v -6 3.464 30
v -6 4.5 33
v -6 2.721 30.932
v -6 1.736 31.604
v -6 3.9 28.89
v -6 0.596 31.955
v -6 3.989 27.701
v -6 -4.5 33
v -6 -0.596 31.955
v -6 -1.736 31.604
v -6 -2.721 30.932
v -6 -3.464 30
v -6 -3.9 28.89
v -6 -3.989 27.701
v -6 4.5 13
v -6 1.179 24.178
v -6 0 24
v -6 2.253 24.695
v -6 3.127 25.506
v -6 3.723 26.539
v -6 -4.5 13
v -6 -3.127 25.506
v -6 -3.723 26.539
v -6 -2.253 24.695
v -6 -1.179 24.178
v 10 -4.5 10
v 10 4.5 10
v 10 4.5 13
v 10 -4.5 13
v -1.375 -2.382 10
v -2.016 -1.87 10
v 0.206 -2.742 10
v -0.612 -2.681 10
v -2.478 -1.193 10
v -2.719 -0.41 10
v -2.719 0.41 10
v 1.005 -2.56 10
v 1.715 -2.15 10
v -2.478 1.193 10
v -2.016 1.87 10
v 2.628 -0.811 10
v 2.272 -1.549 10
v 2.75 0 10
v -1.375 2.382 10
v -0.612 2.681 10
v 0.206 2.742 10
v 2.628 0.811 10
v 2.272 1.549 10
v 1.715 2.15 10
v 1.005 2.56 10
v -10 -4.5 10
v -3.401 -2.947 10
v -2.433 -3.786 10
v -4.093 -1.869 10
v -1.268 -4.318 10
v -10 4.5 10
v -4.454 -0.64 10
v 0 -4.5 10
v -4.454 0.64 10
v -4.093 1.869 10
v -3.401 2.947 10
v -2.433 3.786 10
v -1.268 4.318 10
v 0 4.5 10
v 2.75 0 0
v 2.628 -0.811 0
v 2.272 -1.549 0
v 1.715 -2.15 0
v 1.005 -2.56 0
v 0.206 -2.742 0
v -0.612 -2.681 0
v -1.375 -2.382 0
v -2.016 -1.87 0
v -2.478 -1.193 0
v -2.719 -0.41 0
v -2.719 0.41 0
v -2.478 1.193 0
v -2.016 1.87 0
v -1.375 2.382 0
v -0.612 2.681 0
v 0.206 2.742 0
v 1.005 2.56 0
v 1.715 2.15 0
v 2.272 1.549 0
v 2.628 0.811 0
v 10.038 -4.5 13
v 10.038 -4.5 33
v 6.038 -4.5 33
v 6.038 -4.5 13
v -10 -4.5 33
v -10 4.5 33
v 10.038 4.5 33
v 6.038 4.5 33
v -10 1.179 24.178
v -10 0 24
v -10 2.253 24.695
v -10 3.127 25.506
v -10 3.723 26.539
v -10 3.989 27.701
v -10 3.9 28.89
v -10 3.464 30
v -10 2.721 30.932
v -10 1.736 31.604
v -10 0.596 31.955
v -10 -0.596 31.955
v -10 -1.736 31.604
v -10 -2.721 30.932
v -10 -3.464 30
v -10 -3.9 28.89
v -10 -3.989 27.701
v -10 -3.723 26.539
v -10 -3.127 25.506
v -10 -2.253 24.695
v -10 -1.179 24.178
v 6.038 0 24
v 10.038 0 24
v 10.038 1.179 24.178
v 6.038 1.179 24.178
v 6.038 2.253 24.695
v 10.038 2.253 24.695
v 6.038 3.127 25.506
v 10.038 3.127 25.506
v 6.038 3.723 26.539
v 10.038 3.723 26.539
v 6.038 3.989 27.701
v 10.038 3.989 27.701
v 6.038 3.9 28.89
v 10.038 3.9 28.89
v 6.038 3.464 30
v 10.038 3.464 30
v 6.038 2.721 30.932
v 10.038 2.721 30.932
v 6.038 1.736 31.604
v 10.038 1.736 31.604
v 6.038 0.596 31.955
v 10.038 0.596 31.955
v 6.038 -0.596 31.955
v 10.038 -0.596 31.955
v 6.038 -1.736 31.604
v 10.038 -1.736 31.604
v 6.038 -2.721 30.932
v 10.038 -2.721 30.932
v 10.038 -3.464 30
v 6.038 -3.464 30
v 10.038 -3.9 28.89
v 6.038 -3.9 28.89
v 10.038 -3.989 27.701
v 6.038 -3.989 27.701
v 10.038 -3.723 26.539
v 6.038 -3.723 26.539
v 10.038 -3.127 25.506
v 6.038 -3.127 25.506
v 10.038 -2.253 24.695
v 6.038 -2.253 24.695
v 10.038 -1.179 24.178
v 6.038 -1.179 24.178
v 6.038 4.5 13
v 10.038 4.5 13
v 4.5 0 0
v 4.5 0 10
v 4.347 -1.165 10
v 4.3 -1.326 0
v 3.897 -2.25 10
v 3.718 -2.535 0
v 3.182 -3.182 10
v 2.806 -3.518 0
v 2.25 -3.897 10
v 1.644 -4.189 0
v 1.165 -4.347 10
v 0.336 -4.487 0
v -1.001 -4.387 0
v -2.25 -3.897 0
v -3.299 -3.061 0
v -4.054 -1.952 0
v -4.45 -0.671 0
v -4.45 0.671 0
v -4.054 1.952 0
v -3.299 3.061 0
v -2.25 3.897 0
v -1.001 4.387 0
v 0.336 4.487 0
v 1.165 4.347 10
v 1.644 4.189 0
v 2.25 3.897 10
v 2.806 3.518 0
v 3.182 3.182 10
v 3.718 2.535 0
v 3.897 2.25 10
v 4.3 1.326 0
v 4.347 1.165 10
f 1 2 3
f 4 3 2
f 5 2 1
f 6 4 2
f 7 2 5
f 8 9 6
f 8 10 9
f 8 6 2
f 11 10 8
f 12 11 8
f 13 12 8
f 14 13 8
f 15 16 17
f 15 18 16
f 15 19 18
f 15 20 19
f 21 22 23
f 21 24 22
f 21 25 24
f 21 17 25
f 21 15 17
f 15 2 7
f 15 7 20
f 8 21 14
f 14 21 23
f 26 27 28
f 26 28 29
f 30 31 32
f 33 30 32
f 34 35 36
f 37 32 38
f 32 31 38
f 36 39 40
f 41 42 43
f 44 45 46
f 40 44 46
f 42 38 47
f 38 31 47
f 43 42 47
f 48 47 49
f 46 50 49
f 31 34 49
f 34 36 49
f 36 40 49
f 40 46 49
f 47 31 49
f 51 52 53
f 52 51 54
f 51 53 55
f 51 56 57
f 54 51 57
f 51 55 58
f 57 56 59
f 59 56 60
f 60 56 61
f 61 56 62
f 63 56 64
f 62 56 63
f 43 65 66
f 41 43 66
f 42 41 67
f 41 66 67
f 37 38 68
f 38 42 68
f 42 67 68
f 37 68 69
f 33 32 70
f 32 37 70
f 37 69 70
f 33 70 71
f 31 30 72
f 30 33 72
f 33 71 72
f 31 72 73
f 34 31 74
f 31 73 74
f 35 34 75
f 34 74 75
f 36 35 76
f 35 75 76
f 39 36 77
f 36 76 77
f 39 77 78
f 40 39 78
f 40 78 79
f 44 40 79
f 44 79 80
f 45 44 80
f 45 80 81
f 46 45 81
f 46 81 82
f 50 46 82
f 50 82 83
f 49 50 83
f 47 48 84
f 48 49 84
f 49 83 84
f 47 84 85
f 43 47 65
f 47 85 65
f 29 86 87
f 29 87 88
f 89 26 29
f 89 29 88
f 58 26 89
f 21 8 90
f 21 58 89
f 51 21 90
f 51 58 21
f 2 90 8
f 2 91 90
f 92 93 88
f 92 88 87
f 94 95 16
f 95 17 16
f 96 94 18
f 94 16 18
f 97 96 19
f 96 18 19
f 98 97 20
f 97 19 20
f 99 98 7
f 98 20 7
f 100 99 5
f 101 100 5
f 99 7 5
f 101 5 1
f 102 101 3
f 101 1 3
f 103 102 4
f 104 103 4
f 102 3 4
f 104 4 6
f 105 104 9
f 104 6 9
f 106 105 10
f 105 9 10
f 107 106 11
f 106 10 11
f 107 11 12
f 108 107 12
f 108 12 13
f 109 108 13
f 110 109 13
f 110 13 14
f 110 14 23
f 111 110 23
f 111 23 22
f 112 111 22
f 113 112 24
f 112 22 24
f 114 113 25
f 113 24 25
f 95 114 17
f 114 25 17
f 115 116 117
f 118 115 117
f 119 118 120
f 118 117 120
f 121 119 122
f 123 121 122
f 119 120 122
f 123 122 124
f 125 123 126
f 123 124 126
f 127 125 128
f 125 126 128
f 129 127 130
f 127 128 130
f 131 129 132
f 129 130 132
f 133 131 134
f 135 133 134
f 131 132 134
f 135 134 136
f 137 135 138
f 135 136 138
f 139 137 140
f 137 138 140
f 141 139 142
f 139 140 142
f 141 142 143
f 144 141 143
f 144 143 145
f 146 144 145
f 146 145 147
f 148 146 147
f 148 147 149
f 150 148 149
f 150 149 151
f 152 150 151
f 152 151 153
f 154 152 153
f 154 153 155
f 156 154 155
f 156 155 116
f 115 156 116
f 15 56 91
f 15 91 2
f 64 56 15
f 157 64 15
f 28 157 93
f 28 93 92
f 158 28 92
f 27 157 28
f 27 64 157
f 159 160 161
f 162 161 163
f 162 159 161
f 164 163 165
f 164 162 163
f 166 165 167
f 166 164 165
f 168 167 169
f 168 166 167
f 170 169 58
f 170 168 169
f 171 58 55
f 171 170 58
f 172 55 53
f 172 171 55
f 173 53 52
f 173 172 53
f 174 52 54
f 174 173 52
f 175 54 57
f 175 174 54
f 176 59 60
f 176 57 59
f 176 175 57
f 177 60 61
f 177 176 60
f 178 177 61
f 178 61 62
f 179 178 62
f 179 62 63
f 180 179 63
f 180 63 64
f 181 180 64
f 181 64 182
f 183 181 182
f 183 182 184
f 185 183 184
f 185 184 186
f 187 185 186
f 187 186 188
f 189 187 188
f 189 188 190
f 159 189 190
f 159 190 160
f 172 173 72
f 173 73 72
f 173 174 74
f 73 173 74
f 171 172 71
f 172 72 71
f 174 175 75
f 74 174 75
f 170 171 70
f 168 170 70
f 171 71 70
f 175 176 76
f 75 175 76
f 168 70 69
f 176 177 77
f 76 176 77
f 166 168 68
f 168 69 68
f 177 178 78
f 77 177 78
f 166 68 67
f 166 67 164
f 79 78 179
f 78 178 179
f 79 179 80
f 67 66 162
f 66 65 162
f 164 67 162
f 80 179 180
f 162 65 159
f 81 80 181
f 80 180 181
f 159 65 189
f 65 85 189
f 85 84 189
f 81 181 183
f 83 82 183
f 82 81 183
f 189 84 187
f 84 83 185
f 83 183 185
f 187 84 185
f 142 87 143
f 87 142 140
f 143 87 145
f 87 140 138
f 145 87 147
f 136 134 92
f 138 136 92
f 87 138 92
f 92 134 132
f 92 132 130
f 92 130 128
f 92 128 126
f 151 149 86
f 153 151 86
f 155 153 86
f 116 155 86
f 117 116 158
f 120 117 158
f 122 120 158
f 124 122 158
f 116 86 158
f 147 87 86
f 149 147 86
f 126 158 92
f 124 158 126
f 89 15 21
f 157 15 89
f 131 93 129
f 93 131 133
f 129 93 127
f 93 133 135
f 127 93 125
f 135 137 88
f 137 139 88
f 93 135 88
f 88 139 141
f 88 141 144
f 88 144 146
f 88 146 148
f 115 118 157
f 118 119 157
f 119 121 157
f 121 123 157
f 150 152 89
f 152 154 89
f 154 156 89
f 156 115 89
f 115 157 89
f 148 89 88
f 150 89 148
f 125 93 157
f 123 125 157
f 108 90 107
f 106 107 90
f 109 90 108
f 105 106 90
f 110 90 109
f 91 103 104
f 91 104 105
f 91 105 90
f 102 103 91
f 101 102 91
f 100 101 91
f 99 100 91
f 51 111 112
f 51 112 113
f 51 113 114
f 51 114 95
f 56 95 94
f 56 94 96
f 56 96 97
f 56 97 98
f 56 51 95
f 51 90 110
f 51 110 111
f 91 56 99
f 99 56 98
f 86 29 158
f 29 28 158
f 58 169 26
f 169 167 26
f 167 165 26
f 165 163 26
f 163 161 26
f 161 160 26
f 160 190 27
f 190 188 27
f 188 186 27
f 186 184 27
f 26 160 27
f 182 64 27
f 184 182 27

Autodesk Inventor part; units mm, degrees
ref_plane "YZ Plane" through (0, 0, 0) normal (1, 0, 0) x (0, 1, 0)
ref_plane "XZ Plane" through (0, 0, 0) normal (0, 1, 0) x (-1, 0, 0)
ref_plane "XY Plane" through (0, 0, 0) normal (0, 0, 1) x (1, 0, 0)
sketch "Sketch1" plane through (0, 0, 0) normal (0, 0, 1) x (1, 0, 0)
  circle A0 centre (0, 0) radius 2.75
  circle A1 centre (0, 0) radius 4.5
  dimension "d0" = 5.5
  dimension "d1" = 9
extrude "Extrusion1" add sketch "Sketch1" along normal blind 10
sketch "Sketch2" plane through (0, 0, 10) normal (0, 0, 1) x (1, 0, 0)
  line L0 (-10, 4.5) -> (10, 4.5)
  line L1 (10, 4.5) -> (10, -4.5)
  line L2 (10, -4.5) -> (-10, -4.5)
  line L3 (-10, -4.5) -> (-10, 4.5)
  point P0 (0, 0)
  dimension "d4" = 20
  dimension "d5" = 10
extrude "Extrusion2" add sketch "Sketch2" along normal blind 3
sketch "Sketch3" plane through (0, 0, 13) normal (0, 0, 1) x (1, 0, 0)
  line L0 (10, 4.5) -> (-10, 4.5) projected
  line L1 (-10, -4.5) -> (10, -4.5) projected
  line L2 (-10, 4.5) -> (-6, 4.5)
  line L3 (-6, 4.5) -> (-6, -4.5)
  line L4 (-6, -4.5) -> (-10, -4.5)
  line L5 (-10, -4.5) -> (-10, 4.5)
  line L6 (10.0384, 4.5) -> (6.0384, 4.5)
  line L7 (6.0384, 4.5) -> (6.0384, -4.5)
  line L8 (6.0384, -4.5) -> (10.0384, -4.5)
  line L9 (10.0384, -4.5) -> (10.0384, 4.5)
  point P0 (0, 0)
  dimension "d8" = 4
  dimension "d9" = 4
extrude "Extrusion3" add sketch "Sketch3" along normal blind 20 contours L6 L9 L8 L1 L7 L0 | L3 L1 L5 L0
sketch "Sketch4" plane through (10.0384, -4.5, 13) normal (1, 0, 0) x (0, 0, -1)
  circle A0 centre (-15, 4.5) radius 4
  point P0 (13, 4.5)
  dimension "d12" = 8
  dimension "d13" = 28
extrude "Extrusion4" cut sketch "Sketch4" against normal blind 27
properties part number "Connector"
